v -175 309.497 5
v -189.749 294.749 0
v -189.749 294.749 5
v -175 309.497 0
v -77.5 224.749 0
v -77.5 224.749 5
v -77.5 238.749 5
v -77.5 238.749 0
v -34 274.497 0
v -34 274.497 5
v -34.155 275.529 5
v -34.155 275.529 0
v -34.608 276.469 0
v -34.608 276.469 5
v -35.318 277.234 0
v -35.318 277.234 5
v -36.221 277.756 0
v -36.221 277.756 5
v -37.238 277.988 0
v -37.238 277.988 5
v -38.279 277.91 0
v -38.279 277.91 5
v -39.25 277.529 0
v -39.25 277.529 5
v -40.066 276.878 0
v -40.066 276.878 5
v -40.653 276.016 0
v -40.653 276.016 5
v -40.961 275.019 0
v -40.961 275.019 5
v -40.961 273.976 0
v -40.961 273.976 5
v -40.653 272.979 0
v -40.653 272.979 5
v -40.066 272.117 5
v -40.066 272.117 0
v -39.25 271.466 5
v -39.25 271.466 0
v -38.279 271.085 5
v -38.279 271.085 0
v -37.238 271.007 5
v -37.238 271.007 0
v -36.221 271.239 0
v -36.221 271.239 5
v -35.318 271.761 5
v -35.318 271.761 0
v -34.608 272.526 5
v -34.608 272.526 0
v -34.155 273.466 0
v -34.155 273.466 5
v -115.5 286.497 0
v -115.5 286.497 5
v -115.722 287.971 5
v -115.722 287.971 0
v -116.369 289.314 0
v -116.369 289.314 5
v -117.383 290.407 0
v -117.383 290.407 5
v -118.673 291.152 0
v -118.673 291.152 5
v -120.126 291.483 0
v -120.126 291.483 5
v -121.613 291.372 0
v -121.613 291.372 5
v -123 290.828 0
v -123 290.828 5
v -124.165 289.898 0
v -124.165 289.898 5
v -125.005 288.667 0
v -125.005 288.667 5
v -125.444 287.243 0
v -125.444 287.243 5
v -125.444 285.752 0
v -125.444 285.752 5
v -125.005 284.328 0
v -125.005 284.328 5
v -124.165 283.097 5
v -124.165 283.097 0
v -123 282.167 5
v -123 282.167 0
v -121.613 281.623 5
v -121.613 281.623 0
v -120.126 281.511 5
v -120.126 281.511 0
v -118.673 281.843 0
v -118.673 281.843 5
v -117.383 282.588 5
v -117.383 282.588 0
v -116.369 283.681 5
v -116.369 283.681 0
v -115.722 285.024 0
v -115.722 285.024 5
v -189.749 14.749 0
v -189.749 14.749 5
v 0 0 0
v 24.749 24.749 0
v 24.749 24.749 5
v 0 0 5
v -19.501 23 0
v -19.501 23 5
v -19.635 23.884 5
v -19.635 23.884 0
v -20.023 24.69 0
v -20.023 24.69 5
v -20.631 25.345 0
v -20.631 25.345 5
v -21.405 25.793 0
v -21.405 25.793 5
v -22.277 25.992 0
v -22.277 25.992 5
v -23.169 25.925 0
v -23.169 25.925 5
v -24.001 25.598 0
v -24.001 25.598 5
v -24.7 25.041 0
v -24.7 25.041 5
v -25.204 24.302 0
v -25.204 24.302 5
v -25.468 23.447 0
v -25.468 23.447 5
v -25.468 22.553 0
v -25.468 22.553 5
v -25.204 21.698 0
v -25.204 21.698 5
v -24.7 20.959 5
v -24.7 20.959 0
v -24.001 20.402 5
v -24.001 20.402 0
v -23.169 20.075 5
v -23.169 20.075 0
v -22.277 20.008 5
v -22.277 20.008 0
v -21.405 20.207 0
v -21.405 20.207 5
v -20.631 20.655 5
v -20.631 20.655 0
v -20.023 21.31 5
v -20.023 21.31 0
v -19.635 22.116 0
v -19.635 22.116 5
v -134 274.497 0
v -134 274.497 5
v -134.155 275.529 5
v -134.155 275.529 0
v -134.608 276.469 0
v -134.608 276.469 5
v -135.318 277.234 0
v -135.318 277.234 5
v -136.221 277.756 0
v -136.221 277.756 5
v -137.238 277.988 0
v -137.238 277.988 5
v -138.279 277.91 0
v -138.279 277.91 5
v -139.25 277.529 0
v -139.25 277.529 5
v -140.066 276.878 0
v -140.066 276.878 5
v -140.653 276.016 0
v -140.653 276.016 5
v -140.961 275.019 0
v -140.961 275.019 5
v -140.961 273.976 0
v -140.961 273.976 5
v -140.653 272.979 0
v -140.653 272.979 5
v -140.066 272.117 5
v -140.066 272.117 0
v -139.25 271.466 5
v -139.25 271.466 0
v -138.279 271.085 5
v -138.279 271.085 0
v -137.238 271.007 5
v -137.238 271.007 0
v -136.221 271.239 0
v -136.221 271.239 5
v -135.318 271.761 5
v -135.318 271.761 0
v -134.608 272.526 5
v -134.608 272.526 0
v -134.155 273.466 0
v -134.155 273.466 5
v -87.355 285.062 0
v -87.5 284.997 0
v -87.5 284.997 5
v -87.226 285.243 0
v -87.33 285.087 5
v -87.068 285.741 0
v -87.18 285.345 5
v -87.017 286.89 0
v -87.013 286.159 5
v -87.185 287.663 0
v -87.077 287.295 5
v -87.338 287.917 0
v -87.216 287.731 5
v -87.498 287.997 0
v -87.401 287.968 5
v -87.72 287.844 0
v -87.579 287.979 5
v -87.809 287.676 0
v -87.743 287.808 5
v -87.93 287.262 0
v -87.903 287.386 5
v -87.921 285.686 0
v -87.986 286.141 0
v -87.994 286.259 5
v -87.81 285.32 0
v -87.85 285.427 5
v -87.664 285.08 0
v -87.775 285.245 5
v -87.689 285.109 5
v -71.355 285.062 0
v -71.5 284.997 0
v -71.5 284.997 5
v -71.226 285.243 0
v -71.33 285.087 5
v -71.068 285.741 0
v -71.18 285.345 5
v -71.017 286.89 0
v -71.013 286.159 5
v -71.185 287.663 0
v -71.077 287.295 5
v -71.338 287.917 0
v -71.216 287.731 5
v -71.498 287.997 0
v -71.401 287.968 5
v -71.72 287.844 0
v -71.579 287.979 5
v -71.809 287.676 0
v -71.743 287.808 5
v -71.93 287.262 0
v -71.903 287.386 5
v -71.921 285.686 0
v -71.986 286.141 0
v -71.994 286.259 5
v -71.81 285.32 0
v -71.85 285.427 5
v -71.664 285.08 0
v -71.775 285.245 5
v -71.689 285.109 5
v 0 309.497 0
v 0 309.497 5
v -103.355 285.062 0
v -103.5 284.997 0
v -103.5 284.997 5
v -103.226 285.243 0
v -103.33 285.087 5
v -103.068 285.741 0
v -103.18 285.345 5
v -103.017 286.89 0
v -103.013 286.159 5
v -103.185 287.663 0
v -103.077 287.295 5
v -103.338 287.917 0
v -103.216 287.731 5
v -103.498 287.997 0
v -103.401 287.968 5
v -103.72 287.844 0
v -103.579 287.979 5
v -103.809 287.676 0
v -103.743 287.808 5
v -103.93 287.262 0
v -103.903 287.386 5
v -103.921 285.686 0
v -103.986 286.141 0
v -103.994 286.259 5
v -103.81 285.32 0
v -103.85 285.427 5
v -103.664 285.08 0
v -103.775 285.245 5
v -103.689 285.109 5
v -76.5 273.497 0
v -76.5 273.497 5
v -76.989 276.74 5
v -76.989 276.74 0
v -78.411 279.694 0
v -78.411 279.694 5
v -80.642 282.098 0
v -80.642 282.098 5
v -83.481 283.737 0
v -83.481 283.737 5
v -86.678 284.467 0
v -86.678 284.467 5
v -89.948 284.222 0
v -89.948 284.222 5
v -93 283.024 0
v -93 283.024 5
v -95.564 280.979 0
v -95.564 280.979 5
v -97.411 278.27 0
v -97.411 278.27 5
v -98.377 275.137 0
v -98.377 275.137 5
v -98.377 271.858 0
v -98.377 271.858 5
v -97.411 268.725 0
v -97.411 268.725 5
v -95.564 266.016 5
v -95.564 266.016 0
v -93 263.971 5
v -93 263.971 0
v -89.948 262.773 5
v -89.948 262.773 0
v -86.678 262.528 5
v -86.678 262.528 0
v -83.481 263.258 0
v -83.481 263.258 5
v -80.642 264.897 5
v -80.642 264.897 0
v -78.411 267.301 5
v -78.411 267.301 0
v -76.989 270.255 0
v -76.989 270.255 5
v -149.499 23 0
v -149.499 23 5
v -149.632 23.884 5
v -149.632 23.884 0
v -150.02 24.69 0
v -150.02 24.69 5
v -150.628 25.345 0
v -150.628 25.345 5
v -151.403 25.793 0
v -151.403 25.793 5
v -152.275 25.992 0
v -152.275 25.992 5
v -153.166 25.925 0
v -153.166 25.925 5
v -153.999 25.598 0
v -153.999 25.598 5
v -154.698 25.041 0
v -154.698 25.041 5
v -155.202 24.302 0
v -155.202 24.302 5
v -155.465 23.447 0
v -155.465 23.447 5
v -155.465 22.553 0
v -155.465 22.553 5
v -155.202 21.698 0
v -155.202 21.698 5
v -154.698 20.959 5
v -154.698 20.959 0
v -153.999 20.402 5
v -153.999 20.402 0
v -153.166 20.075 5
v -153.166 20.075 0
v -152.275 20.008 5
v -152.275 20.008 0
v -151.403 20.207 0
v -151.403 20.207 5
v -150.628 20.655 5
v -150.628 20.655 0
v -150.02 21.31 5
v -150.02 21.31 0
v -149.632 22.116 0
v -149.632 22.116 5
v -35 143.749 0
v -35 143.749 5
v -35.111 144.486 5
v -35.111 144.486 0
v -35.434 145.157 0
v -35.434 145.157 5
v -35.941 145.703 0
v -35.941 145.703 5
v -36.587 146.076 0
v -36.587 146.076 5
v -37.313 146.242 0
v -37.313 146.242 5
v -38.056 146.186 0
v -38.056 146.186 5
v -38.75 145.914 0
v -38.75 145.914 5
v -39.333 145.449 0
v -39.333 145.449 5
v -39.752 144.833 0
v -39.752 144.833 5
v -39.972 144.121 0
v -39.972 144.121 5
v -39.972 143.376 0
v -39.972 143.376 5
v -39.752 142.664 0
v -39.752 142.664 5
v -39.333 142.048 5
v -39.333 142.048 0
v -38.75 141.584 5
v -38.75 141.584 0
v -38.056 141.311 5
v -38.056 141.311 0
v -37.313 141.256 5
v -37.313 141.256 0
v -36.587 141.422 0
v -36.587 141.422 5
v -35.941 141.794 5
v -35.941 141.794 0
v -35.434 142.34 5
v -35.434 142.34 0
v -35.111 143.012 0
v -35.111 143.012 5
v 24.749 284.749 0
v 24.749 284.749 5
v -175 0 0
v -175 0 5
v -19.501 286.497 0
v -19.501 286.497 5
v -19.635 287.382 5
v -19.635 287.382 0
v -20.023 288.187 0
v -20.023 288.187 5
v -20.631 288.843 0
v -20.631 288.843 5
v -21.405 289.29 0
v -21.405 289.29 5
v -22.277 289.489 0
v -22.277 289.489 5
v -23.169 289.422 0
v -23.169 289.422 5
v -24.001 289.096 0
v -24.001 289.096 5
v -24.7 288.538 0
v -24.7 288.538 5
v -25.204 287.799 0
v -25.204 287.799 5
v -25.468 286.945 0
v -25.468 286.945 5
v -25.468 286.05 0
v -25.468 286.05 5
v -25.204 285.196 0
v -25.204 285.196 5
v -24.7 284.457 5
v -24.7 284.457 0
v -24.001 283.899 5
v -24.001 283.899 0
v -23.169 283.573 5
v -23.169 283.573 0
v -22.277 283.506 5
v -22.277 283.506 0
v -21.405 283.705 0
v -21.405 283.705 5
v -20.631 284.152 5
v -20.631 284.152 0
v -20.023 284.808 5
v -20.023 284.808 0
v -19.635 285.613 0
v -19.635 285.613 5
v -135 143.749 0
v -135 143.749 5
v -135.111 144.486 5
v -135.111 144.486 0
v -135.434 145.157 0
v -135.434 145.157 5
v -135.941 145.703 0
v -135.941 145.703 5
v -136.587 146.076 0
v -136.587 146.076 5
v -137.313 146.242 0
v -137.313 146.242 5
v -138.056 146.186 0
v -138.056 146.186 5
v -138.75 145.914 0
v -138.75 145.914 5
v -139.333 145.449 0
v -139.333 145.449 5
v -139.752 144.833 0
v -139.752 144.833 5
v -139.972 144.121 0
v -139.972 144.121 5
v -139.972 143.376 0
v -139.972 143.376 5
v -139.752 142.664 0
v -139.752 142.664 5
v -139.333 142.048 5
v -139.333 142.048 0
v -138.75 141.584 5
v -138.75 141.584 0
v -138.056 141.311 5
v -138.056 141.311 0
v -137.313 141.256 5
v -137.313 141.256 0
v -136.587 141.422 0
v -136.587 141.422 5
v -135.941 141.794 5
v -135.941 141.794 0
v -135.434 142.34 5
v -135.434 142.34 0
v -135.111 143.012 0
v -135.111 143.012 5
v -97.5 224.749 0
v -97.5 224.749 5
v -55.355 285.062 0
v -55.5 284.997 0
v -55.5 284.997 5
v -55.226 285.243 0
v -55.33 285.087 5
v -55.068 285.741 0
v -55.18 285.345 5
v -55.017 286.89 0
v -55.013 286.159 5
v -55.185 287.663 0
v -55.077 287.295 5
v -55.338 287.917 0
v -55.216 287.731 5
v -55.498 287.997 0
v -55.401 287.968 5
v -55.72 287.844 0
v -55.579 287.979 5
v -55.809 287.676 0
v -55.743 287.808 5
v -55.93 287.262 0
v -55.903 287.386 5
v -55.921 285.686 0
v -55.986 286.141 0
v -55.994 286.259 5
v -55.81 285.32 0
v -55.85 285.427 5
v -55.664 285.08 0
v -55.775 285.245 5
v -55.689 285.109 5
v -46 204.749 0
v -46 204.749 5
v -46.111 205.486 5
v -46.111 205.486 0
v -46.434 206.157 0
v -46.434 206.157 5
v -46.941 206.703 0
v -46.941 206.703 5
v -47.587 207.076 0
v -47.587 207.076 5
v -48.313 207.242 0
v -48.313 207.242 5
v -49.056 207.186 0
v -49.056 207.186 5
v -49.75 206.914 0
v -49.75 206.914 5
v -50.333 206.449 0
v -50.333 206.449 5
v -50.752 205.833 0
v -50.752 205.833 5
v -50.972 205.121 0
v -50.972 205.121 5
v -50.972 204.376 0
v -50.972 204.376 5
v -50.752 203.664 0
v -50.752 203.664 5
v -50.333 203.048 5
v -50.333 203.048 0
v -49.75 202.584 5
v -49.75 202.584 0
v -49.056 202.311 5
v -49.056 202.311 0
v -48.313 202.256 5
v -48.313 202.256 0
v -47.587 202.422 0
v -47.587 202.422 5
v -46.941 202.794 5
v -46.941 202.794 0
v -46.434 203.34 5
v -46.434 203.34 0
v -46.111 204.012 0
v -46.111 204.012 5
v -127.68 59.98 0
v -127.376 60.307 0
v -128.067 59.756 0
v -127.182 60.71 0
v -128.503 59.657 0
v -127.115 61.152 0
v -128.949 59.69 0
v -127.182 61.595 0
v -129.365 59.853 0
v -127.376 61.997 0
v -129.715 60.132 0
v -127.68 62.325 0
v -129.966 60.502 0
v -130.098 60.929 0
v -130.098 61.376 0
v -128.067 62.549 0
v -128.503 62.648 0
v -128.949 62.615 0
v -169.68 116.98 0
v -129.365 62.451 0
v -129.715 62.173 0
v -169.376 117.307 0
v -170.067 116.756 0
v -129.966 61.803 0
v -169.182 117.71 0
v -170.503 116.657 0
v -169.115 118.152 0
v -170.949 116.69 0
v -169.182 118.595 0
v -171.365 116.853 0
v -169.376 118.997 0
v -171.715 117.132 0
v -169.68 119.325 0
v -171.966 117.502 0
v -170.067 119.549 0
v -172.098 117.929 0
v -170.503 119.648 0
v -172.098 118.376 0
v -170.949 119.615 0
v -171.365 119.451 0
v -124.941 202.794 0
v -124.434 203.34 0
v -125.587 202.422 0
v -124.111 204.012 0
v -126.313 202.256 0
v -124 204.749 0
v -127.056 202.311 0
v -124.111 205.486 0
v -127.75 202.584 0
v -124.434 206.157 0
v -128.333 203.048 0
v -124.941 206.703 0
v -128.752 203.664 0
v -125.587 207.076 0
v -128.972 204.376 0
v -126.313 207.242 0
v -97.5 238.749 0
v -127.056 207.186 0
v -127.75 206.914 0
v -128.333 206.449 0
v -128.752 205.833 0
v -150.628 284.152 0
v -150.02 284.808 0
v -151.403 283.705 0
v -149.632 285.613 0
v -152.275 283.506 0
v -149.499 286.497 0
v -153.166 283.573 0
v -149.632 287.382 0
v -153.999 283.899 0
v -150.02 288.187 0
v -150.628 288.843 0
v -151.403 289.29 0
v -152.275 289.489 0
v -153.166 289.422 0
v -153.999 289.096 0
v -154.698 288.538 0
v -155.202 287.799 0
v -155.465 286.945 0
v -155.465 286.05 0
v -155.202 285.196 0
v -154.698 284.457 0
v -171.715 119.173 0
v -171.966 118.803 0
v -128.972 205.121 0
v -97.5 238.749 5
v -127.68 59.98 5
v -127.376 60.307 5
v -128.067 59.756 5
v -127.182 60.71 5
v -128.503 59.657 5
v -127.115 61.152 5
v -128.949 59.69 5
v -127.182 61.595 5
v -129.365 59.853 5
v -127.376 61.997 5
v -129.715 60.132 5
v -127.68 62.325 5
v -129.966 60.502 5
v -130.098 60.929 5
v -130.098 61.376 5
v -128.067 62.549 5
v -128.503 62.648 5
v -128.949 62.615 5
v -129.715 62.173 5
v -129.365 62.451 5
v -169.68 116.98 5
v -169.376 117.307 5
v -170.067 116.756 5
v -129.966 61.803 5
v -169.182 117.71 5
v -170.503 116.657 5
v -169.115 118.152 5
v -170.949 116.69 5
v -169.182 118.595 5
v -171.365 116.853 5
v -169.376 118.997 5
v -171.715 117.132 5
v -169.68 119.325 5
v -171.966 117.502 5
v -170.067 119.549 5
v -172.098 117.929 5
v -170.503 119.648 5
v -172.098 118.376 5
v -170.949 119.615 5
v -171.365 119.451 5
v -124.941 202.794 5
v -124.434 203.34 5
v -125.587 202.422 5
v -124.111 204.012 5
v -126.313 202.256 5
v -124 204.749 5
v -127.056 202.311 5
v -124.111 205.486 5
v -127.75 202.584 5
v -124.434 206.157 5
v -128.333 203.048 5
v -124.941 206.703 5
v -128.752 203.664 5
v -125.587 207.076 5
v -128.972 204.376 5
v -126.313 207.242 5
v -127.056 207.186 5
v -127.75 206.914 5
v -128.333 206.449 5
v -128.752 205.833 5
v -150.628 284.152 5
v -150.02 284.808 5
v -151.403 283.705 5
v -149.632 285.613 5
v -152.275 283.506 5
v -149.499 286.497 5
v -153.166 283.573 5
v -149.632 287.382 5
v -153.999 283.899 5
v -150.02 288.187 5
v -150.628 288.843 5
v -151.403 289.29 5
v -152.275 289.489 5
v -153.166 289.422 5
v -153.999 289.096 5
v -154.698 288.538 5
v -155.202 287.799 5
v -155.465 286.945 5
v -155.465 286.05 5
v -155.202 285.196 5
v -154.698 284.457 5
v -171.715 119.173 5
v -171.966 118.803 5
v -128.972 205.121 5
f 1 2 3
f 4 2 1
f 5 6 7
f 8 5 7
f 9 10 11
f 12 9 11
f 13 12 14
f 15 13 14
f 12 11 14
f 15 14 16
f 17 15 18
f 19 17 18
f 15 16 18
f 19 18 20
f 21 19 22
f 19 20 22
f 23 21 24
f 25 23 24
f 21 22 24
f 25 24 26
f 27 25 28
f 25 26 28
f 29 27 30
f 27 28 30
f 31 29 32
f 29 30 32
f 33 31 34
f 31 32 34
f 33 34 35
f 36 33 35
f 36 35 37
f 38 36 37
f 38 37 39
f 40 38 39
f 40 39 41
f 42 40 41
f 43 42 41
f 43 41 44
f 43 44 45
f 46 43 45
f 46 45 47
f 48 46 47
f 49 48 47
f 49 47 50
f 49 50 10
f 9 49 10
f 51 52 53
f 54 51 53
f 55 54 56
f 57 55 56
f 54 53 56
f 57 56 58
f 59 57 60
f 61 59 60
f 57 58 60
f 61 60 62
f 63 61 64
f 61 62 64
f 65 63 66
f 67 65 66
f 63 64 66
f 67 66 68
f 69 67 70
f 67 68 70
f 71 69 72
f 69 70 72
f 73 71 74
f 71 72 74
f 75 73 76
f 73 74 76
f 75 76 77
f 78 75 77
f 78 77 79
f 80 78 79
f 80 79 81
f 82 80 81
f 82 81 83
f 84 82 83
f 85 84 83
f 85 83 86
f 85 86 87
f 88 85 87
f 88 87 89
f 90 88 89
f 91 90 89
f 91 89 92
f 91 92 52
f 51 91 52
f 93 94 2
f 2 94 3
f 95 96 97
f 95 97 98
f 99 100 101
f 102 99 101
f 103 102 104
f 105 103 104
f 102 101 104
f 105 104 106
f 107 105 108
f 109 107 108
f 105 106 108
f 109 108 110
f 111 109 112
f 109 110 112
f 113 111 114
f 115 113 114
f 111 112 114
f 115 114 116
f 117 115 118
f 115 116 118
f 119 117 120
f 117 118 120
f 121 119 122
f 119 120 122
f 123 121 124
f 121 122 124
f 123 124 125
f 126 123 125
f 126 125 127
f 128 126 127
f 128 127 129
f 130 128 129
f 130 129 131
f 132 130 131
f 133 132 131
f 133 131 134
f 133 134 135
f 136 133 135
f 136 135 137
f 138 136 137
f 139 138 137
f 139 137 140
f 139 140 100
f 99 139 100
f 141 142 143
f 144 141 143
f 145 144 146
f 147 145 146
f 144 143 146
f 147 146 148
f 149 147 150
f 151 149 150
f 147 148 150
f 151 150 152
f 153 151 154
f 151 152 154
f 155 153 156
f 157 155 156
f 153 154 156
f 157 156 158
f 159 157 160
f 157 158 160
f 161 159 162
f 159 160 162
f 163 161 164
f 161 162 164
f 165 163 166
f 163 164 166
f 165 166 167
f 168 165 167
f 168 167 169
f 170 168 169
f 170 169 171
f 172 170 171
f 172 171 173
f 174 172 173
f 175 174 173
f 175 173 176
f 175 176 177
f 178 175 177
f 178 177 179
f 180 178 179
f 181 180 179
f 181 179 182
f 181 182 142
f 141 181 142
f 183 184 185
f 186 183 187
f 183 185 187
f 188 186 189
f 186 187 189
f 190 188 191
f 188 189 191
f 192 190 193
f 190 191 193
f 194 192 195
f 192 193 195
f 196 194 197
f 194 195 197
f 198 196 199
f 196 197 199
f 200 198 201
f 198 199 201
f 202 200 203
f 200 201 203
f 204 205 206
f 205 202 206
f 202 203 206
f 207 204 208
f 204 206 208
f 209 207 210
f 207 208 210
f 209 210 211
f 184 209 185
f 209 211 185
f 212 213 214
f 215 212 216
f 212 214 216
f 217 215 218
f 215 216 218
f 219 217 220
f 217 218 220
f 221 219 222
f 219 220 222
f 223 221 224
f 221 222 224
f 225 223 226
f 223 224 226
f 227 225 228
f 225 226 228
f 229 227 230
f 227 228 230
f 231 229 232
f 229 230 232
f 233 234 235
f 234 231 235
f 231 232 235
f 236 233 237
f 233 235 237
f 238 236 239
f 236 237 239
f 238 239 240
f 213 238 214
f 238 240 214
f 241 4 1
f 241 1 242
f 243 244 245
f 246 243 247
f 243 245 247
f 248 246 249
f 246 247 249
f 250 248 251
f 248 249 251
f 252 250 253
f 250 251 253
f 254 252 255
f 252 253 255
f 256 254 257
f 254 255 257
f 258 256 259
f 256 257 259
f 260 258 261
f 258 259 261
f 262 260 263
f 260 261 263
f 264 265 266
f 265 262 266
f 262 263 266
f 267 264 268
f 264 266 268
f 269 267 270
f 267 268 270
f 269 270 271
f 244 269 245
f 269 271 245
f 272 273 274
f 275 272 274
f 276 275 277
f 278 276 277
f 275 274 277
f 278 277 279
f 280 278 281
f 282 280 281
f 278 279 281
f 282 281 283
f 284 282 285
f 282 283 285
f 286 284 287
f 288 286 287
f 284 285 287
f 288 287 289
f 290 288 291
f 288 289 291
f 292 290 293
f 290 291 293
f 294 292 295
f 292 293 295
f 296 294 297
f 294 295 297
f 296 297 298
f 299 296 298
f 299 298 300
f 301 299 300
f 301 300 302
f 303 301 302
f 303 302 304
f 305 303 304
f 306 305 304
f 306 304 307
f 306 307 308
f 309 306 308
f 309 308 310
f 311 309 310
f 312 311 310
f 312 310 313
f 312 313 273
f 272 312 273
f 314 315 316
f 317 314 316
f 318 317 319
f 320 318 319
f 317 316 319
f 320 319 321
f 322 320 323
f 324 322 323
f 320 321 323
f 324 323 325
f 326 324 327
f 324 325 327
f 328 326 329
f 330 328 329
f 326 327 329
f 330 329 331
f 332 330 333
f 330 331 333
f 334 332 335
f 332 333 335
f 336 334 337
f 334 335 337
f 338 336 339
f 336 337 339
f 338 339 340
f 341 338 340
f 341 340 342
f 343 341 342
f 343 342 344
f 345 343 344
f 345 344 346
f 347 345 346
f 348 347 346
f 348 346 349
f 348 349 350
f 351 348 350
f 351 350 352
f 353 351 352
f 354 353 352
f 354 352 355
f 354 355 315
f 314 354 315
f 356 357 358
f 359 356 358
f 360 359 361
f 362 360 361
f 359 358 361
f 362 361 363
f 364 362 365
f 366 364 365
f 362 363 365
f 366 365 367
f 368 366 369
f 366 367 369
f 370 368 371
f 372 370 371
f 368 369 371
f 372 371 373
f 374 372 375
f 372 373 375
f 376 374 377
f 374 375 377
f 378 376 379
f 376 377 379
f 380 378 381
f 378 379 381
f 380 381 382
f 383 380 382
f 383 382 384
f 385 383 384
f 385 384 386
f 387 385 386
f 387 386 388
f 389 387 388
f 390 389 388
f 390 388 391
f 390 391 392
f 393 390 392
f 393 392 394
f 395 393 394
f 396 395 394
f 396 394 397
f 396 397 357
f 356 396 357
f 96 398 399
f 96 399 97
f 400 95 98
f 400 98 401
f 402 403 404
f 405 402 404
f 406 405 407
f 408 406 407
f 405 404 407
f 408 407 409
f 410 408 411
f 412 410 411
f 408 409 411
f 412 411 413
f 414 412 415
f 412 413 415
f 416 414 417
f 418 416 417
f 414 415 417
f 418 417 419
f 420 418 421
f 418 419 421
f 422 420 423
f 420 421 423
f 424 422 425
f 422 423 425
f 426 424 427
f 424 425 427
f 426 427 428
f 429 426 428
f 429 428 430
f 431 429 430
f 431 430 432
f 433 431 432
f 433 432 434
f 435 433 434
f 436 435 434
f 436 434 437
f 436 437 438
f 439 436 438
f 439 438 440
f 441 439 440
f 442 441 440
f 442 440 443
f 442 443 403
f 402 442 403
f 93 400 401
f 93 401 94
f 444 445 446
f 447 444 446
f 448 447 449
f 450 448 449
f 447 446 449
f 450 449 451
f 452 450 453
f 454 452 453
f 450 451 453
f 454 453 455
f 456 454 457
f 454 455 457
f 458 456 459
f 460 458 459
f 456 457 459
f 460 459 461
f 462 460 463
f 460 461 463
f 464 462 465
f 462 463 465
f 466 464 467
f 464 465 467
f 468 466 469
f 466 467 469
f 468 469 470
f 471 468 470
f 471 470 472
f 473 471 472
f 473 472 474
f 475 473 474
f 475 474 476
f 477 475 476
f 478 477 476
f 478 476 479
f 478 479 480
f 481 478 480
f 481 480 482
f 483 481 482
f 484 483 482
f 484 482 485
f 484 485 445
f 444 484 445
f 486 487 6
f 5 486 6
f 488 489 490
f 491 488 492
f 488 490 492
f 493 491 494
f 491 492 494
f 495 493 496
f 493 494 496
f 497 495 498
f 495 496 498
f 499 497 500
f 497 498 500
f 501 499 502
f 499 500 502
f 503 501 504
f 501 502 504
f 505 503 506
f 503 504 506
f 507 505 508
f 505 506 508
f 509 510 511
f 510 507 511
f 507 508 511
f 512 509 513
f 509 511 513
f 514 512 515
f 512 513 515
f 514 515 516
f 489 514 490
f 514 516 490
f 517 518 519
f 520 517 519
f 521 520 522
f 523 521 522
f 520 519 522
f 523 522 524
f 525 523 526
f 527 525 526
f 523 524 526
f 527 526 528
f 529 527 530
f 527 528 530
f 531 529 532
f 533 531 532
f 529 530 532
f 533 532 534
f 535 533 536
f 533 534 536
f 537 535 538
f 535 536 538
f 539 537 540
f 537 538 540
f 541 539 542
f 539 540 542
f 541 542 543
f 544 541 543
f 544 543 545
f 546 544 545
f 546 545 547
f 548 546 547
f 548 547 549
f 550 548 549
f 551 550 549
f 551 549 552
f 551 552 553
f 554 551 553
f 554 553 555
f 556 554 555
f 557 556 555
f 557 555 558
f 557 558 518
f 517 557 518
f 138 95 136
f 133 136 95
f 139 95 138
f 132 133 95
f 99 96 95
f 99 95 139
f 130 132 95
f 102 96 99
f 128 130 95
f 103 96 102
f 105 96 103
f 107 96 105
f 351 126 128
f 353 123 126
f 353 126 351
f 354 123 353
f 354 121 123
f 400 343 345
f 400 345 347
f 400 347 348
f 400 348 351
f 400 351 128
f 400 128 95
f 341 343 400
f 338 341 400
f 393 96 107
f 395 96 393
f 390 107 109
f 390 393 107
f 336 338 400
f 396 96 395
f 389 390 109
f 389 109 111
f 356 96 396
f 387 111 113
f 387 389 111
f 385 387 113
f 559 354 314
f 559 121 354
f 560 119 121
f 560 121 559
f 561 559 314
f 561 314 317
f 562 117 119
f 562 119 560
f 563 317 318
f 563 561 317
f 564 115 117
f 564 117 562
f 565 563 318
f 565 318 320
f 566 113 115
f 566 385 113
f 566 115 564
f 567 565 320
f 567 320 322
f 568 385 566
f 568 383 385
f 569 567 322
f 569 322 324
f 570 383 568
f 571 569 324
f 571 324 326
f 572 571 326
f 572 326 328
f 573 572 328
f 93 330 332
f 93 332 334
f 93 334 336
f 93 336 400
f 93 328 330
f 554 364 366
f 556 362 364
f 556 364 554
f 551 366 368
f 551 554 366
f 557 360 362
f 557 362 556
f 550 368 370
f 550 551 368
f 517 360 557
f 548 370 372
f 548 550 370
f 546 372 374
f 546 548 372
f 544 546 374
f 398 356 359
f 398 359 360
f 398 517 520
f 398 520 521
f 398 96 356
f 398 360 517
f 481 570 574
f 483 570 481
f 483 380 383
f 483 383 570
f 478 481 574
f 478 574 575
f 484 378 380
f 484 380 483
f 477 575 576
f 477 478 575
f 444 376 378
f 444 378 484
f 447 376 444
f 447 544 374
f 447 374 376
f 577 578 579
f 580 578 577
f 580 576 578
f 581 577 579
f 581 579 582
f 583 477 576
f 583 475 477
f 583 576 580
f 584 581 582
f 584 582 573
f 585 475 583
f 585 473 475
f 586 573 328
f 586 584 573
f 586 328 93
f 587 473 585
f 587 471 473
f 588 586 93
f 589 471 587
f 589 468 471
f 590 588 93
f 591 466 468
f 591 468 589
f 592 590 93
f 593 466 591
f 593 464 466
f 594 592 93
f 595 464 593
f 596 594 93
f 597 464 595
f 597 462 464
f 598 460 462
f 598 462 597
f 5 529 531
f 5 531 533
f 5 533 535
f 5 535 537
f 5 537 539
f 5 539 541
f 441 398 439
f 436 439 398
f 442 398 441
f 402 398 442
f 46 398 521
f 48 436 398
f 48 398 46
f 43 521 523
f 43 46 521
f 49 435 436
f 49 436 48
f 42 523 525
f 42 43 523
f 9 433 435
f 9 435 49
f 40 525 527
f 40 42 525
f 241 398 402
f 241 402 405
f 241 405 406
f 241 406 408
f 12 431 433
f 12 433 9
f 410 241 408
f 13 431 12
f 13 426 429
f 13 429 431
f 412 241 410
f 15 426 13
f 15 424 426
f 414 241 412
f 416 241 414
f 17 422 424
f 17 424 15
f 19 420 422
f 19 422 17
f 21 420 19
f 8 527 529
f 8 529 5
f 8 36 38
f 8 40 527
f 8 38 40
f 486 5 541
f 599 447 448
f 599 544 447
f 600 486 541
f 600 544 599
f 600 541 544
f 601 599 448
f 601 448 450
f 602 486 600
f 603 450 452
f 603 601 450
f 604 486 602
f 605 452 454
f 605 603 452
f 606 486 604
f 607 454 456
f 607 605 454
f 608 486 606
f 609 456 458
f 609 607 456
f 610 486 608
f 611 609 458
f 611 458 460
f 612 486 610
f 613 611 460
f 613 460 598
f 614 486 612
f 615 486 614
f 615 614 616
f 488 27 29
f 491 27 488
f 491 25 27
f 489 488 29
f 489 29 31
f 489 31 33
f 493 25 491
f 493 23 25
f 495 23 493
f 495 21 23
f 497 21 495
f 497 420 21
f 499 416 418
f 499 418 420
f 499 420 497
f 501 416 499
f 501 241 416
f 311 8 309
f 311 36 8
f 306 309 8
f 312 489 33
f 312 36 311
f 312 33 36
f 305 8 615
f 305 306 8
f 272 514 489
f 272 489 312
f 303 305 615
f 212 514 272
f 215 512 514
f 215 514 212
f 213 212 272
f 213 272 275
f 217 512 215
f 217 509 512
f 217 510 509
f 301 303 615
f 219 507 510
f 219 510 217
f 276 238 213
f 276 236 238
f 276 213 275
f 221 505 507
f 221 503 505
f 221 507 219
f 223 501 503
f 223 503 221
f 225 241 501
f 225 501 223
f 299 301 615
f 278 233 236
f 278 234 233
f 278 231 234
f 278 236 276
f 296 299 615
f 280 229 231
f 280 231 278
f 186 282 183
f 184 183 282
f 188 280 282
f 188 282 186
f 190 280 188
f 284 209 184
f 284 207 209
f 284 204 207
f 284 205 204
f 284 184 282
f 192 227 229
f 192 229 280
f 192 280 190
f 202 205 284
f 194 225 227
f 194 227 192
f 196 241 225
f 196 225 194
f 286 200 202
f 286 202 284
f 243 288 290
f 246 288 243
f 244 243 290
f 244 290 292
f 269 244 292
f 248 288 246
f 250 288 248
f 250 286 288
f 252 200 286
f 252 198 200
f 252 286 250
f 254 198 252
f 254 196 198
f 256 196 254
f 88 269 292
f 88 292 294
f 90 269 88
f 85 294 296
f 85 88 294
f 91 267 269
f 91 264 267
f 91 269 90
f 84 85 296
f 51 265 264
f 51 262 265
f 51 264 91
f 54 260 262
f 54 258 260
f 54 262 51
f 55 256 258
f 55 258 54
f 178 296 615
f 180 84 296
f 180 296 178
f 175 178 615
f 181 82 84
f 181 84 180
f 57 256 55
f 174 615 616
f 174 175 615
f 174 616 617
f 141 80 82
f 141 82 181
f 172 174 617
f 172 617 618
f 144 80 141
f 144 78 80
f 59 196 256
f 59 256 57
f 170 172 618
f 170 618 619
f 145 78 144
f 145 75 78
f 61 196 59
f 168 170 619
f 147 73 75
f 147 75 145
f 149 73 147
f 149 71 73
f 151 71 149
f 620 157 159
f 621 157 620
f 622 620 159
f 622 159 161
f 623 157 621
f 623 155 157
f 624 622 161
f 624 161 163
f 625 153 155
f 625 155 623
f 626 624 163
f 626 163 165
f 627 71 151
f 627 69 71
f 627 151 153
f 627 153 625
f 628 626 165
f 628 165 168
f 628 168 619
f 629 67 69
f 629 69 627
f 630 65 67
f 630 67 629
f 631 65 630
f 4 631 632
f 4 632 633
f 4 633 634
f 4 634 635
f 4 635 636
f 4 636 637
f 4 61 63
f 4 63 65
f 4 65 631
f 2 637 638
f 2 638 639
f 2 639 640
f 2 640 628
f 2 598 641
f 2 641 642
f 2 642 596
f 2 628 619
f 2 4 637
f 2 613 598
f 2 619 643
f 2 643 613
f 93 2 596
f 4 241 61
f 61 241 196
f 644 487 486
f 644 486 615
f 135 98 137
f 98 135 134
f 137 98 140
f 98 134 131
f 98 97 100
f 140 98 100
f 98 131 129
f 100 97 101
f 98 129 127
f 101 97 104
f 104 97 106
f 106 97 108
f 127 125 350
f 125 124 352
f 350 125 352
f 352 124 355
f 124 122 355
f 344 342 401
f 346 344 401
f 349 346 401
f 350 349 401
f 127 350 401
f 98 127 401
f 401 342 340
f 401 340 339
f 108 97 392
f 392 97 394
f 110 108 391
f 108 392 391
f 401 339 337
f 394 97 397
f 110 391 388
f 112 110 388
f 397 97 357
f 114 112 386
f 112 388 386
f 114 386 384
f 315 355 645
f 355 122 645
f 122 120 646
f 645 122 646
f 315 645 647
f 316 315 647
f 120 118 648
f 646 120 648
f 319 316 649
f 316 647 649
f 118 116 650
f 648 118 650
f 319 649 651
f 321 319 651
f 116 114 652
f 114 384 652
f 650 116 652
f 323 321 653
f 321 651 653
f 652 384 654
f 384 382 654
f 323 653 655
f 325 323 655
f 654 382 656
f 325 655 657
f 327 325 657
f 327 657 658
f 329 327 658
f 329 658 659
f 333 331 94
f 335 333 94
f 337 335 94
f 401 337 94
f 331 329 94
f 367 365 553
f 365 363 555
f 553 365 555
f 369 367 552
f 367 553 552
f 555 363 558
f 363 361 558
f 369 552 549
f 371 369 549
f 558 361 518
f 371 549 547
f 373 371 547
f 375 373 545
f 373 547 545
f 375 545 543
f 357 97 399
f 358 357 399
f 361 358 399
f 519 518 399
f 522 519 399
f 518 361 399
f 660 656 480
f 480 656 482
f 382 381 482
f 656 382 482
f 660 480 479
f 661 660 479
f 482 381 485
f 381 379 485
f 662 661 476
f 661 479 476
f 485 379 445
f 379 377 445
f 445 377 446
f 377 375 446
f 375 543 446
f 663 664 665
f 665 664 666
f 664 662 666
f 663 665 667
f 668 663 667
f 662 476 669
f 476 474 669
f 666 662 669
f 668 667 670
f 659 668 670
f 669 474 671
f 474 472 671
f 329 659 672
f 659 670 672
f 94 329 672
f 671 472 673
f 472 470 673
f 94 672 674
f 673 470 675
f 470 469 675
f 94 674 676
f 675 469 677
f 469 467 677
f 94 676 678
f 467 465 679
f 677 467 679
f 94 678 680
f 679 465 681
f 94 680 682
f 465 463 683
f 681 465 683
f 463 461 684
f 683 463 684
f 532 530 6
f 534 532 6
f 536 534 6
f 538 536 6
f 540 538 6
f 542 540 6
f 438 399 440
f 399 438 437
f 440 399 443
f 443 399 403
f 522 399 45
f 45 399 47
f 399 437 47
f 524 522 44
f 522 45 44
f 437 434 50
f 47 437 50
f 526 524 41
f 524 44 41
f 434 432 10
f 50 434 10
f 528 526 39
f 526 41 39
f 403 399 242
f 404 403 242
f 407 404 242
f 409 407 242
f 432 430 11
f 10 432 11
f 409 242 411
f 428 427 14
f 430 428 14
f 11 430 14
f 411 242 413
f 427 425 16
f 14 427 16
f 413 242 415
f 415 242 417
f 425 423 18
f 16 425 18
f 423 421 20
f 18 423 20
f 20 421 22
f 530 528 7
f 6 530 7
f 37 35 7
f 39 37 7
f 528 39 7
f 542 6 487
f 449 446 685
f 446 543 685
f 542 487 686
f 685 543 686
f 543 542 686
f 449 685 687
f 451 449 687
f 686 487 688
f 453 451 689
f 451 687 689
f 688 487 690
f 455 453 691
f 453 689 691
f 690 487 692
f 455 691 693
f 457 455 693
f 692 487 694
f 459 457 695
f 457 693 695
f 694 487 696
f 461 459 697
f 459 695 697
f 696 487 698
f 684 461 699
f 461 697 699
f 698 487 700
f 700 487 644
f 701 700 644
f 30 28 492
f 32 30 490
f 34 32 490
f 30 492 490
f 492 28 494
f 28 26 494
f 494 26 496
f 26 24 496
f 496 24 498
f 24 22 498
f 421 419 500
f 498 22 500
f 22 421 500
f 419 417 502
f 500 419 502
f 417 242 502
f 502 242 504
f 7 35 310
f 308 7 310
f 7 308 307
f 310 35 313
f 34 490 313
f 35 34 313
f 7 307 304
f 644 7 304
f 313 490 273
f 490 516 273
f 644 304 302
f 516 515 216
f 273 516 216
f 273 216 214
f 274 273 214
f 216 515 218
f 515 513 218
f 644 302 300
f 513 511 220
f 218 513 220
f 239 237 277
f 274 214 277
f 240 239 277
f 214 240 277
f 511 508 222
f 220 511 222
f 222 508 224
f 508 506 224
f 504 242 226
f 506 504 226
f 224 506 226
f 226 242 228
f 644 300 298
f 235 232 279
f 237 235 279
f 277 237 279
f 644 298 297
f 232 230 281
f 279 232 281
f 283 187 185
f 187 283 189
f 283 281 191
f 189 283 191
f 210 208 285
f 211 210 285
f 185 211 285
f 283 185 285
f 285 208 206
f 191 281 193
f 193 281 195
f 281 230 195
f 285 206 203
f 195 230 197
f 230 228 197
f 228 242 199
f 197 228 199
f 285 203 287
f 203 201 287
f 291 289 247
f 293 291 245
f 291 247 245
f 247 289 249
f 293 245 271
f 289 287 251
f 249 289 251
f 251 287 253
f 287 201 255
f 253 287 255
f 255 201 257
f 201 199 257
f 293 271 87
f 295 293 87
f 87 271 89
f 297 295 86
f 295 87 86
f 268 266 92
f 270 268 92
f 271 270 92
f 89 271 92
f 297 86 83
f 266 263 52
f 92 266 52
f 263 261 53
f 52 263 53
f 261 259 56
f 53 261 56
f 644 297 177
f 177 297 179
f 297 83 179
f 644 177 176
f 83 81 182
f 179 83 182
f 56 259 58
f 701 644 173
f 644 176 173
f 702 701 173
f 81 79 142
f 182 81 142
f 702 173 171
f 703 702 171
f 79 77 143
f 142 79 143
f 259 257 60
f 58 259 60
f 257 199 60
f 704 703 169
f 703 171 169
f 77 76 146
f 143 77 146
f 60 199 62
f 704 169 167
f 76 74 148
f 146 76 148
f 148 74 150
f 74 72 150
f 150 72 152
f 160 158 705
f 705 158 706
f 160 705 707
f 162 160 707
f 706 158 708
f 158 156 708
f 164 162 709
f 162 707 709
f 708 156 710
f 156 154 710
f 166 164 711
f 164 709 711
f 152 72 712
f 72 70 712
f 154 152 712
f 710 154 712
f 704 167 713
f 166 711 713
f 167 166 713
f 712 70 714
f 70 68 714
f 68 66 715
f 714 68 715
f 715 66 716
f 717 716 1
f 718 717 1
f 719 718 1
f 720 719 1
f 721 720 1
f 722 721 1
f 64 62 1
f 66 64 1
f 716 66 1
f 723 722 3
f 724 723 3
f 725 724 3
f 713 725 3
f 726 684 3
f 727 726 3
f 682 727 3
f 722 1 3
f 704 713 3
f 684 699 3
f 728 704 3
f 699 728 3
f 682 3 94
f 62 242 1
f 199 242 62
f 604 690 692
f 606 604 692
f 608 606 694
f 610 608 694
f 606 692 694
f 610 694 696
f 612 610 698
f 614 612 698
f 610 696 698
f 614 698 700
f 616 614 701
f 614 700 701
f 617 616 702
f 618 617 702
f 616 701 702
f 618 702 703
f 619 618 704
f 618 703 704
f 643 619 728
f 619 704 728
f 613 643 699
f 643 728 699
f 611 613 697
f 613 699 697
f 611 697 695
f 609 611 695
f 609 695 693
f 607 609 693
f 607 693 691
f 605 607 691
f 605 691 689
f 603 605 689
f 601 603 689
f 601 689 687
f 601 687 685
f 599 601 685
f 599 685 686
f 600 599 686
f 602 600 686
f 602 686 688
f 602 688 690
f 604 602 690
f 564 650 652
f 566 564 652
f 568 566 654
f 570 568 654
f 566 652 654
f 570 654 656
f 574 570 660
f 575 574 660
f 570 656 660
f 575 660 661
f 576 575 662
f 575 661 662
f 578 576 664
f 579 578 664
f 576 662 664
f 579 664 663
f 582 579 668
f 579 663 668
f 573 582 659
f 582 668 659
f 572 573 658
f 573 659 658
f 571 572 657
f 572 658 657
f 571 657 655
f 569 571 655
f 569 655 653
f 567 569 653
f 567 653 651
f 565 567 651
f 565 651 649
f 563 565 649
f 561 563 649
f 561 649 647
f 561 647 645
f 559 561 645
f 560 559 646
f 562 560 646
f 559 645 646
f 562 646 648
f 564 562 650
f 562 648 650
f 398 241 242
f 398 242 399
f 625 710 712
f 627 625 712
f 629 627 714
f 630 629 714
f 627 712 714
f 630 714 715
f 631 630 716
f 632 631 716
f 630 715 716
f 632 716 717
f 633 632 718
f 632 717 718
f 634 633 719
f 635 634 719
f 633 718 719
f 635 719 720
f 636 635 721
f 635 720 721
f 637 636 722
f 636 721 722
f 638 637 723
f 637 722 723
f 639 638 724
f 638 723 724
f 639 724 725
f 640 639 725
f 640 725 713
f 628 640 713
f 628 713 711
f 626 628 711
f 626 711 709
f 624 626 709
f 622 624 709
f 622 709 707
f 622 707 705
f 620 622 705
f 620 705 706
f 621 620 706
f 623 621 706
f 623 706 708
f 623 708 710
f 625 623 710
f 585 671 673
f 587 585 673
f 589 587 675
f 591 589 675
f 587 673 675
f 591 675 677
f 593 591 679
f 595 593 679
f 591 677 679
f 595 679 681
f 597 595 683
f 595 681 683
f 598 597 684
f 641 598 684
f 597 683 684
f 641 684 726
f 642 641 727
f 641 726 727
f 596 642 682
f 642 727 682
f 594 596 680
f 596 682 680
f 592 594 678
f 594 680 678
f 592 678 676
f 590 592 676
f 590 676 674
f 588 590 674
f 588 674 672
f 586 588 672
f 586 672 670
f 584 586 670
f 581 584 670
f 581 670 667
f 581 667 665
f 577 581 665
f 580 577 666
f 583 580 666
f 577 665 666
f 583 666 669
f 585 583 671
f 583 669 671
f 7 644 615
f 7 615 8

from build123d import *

# Parameters (mm, degrees)
BASE_DEPTH               = 5
ESQUISSE8_R              = 5
ENL_V_MAT_EXTRU_7_DEPTH  = 10
ESQUISSE4_R              = 11
ESQUISSE4_R_2            = 3.5
ESQUISSE4_RX             = 1.5
ESQUISSE4_RY             = 0.5
ESQUISSE4_W              = 20
ESQUISSE4_H              = 14
ENL_V_MAT_EXTRU_8_DEPTH  = 10
ESQUISSE2_R              = 3
ESQUISSE2_R_2            = 2.5
ENL_V_MAT_EXTRU_9_DEPTH  = 10
ESQUISSE11_R             = 1.5
ENL_V_MAT_EXTRU_11_DEPTH = 5


with BuildPart() as part:
    # Esquisse1 → Base (new body)
    with BuildSketch(Plane.XY):
        Polygon((0, 0), (-175, 0), (-199.748737342, 24.748737342), (-199.748737342, 284.748737342), (-175, 309.497474683), (0, 309.497474683), (24.748737342, 284.748737342), (24.748737342, 24.748737342), align=None)
    extrude(amount=BASE_DEPTH)

    # Esquisse8 → Enlèv. mat.-Extru.7 (cut)
    with BuildSketch(Plane.XY.offset(5)):
        with Locations((-120.5, 286.497474683)):
            Circle(ESQUISSE8_R)
    extrude(amount=-ENL_V_MAT_EXTRU_7_DEPTH, mode=Mode.SUBTRACT)

    # Esquisse4 → Enlèv. mat.-Extru.8 (cut)
    with BuildSketch(Plane.XY.offset(5)):
        with Locations((-87.5, 273.497474683)):
            Circle(ESQUISSE4_R)
        with Locations((-137.5, 274.497474683)):
            Circle(ESQUISSE4_R_2)
        with Locations((-37.5, 274.497474683)):
            Circle(ESQUISSE4_R_2)
        with Locations(Location((-103.5, 286.497474683), (0, 0, -90))):
            Ellipse(ESQUISSE4_RX, ESQUISSE4_RY)
        with Locations(Location((-87.5, 286.497474683), (0, 0, -90))):
            Ellipse(ESQUISSE4_RX, ESQUISSE4_RY)
        with Locations(Location((-71.5, 286.497474683), (0, 0, -90))):
            Ellipse(ESQUISSE4_RX, ESQUISSE4_RY)
        with Locations(Location((-55.5, 286.497474683), (0, 0, -90))):
            Ellipse(ESQUISSE4_RX, ESQUISSE4_RY)
        with Locations((-87.5, 231.748737342)):
            Rectangle(ESQUISSE4_W, ESQUISSE4_H)
    extrude(amount=-ENL_V_MAT_EXTRU_8_DEPTH, mode=Mode.SUBTRACT)

    # Esquisse2 → Enlèv. mat.-Extru.9 (cut)
    with BuildSketch(Plane.XY.offset(5)):
        with Locations((-152.498737342, 23)):
            Circle(ESQUISSE2_R)
        with Locations((-152.498737342, 286.497474683)):
            Circle(ESQUISSE2_R)
        with Locations((-22.501262658, 23)):
            Circle(ESQUISSE2_R)
        with Locations((-22.501262658, 286.497474683)):
            Circle(ESQUISSE2_R)
        with Locations((-137.5, 143.748737342)):
            Circle(ESQUISSE2_R_2)
        with Locations((-126.5, 204.748737342)):
            Circle(ESQUISSE2_R_2)
        with Locations((-37.5, 143.748737342)):
            Circle(ESQUISSE2_R_2)
        with Locations((-48.5, 204.748737342)):
            Circle(ESQUISSE2_R_2)
    extrude(amount=-ENL_V_MAT_EXTRU_9_DEPTH, mode=Mode.SUBTRACT)

    # Esquisse11 → Enlèv. mat.-Extru.11 (cut)
    with BuildSketch(Plane.XY.offset(5)):
        with Locations((-170.614939475, 118.152371839)):
            Circle(ESQUISSE11_R)
        with Locations((-128.614939475, 61.152371839)):
            Circle(ESQUISSE11_R)
        Polygon((-189.748737342, -12.261016229), (-189.748737342, 134.748737342), (-189.748737342, 326.523808624), (-199.748737342, 326.523808624), (-199.748737342, -12.261016229), align=None)
    extrude(amount=-ENL_V_MAT_EXTRU_11_DEPTH, mode=Mode.SUBTRACT)


solid = part.part
